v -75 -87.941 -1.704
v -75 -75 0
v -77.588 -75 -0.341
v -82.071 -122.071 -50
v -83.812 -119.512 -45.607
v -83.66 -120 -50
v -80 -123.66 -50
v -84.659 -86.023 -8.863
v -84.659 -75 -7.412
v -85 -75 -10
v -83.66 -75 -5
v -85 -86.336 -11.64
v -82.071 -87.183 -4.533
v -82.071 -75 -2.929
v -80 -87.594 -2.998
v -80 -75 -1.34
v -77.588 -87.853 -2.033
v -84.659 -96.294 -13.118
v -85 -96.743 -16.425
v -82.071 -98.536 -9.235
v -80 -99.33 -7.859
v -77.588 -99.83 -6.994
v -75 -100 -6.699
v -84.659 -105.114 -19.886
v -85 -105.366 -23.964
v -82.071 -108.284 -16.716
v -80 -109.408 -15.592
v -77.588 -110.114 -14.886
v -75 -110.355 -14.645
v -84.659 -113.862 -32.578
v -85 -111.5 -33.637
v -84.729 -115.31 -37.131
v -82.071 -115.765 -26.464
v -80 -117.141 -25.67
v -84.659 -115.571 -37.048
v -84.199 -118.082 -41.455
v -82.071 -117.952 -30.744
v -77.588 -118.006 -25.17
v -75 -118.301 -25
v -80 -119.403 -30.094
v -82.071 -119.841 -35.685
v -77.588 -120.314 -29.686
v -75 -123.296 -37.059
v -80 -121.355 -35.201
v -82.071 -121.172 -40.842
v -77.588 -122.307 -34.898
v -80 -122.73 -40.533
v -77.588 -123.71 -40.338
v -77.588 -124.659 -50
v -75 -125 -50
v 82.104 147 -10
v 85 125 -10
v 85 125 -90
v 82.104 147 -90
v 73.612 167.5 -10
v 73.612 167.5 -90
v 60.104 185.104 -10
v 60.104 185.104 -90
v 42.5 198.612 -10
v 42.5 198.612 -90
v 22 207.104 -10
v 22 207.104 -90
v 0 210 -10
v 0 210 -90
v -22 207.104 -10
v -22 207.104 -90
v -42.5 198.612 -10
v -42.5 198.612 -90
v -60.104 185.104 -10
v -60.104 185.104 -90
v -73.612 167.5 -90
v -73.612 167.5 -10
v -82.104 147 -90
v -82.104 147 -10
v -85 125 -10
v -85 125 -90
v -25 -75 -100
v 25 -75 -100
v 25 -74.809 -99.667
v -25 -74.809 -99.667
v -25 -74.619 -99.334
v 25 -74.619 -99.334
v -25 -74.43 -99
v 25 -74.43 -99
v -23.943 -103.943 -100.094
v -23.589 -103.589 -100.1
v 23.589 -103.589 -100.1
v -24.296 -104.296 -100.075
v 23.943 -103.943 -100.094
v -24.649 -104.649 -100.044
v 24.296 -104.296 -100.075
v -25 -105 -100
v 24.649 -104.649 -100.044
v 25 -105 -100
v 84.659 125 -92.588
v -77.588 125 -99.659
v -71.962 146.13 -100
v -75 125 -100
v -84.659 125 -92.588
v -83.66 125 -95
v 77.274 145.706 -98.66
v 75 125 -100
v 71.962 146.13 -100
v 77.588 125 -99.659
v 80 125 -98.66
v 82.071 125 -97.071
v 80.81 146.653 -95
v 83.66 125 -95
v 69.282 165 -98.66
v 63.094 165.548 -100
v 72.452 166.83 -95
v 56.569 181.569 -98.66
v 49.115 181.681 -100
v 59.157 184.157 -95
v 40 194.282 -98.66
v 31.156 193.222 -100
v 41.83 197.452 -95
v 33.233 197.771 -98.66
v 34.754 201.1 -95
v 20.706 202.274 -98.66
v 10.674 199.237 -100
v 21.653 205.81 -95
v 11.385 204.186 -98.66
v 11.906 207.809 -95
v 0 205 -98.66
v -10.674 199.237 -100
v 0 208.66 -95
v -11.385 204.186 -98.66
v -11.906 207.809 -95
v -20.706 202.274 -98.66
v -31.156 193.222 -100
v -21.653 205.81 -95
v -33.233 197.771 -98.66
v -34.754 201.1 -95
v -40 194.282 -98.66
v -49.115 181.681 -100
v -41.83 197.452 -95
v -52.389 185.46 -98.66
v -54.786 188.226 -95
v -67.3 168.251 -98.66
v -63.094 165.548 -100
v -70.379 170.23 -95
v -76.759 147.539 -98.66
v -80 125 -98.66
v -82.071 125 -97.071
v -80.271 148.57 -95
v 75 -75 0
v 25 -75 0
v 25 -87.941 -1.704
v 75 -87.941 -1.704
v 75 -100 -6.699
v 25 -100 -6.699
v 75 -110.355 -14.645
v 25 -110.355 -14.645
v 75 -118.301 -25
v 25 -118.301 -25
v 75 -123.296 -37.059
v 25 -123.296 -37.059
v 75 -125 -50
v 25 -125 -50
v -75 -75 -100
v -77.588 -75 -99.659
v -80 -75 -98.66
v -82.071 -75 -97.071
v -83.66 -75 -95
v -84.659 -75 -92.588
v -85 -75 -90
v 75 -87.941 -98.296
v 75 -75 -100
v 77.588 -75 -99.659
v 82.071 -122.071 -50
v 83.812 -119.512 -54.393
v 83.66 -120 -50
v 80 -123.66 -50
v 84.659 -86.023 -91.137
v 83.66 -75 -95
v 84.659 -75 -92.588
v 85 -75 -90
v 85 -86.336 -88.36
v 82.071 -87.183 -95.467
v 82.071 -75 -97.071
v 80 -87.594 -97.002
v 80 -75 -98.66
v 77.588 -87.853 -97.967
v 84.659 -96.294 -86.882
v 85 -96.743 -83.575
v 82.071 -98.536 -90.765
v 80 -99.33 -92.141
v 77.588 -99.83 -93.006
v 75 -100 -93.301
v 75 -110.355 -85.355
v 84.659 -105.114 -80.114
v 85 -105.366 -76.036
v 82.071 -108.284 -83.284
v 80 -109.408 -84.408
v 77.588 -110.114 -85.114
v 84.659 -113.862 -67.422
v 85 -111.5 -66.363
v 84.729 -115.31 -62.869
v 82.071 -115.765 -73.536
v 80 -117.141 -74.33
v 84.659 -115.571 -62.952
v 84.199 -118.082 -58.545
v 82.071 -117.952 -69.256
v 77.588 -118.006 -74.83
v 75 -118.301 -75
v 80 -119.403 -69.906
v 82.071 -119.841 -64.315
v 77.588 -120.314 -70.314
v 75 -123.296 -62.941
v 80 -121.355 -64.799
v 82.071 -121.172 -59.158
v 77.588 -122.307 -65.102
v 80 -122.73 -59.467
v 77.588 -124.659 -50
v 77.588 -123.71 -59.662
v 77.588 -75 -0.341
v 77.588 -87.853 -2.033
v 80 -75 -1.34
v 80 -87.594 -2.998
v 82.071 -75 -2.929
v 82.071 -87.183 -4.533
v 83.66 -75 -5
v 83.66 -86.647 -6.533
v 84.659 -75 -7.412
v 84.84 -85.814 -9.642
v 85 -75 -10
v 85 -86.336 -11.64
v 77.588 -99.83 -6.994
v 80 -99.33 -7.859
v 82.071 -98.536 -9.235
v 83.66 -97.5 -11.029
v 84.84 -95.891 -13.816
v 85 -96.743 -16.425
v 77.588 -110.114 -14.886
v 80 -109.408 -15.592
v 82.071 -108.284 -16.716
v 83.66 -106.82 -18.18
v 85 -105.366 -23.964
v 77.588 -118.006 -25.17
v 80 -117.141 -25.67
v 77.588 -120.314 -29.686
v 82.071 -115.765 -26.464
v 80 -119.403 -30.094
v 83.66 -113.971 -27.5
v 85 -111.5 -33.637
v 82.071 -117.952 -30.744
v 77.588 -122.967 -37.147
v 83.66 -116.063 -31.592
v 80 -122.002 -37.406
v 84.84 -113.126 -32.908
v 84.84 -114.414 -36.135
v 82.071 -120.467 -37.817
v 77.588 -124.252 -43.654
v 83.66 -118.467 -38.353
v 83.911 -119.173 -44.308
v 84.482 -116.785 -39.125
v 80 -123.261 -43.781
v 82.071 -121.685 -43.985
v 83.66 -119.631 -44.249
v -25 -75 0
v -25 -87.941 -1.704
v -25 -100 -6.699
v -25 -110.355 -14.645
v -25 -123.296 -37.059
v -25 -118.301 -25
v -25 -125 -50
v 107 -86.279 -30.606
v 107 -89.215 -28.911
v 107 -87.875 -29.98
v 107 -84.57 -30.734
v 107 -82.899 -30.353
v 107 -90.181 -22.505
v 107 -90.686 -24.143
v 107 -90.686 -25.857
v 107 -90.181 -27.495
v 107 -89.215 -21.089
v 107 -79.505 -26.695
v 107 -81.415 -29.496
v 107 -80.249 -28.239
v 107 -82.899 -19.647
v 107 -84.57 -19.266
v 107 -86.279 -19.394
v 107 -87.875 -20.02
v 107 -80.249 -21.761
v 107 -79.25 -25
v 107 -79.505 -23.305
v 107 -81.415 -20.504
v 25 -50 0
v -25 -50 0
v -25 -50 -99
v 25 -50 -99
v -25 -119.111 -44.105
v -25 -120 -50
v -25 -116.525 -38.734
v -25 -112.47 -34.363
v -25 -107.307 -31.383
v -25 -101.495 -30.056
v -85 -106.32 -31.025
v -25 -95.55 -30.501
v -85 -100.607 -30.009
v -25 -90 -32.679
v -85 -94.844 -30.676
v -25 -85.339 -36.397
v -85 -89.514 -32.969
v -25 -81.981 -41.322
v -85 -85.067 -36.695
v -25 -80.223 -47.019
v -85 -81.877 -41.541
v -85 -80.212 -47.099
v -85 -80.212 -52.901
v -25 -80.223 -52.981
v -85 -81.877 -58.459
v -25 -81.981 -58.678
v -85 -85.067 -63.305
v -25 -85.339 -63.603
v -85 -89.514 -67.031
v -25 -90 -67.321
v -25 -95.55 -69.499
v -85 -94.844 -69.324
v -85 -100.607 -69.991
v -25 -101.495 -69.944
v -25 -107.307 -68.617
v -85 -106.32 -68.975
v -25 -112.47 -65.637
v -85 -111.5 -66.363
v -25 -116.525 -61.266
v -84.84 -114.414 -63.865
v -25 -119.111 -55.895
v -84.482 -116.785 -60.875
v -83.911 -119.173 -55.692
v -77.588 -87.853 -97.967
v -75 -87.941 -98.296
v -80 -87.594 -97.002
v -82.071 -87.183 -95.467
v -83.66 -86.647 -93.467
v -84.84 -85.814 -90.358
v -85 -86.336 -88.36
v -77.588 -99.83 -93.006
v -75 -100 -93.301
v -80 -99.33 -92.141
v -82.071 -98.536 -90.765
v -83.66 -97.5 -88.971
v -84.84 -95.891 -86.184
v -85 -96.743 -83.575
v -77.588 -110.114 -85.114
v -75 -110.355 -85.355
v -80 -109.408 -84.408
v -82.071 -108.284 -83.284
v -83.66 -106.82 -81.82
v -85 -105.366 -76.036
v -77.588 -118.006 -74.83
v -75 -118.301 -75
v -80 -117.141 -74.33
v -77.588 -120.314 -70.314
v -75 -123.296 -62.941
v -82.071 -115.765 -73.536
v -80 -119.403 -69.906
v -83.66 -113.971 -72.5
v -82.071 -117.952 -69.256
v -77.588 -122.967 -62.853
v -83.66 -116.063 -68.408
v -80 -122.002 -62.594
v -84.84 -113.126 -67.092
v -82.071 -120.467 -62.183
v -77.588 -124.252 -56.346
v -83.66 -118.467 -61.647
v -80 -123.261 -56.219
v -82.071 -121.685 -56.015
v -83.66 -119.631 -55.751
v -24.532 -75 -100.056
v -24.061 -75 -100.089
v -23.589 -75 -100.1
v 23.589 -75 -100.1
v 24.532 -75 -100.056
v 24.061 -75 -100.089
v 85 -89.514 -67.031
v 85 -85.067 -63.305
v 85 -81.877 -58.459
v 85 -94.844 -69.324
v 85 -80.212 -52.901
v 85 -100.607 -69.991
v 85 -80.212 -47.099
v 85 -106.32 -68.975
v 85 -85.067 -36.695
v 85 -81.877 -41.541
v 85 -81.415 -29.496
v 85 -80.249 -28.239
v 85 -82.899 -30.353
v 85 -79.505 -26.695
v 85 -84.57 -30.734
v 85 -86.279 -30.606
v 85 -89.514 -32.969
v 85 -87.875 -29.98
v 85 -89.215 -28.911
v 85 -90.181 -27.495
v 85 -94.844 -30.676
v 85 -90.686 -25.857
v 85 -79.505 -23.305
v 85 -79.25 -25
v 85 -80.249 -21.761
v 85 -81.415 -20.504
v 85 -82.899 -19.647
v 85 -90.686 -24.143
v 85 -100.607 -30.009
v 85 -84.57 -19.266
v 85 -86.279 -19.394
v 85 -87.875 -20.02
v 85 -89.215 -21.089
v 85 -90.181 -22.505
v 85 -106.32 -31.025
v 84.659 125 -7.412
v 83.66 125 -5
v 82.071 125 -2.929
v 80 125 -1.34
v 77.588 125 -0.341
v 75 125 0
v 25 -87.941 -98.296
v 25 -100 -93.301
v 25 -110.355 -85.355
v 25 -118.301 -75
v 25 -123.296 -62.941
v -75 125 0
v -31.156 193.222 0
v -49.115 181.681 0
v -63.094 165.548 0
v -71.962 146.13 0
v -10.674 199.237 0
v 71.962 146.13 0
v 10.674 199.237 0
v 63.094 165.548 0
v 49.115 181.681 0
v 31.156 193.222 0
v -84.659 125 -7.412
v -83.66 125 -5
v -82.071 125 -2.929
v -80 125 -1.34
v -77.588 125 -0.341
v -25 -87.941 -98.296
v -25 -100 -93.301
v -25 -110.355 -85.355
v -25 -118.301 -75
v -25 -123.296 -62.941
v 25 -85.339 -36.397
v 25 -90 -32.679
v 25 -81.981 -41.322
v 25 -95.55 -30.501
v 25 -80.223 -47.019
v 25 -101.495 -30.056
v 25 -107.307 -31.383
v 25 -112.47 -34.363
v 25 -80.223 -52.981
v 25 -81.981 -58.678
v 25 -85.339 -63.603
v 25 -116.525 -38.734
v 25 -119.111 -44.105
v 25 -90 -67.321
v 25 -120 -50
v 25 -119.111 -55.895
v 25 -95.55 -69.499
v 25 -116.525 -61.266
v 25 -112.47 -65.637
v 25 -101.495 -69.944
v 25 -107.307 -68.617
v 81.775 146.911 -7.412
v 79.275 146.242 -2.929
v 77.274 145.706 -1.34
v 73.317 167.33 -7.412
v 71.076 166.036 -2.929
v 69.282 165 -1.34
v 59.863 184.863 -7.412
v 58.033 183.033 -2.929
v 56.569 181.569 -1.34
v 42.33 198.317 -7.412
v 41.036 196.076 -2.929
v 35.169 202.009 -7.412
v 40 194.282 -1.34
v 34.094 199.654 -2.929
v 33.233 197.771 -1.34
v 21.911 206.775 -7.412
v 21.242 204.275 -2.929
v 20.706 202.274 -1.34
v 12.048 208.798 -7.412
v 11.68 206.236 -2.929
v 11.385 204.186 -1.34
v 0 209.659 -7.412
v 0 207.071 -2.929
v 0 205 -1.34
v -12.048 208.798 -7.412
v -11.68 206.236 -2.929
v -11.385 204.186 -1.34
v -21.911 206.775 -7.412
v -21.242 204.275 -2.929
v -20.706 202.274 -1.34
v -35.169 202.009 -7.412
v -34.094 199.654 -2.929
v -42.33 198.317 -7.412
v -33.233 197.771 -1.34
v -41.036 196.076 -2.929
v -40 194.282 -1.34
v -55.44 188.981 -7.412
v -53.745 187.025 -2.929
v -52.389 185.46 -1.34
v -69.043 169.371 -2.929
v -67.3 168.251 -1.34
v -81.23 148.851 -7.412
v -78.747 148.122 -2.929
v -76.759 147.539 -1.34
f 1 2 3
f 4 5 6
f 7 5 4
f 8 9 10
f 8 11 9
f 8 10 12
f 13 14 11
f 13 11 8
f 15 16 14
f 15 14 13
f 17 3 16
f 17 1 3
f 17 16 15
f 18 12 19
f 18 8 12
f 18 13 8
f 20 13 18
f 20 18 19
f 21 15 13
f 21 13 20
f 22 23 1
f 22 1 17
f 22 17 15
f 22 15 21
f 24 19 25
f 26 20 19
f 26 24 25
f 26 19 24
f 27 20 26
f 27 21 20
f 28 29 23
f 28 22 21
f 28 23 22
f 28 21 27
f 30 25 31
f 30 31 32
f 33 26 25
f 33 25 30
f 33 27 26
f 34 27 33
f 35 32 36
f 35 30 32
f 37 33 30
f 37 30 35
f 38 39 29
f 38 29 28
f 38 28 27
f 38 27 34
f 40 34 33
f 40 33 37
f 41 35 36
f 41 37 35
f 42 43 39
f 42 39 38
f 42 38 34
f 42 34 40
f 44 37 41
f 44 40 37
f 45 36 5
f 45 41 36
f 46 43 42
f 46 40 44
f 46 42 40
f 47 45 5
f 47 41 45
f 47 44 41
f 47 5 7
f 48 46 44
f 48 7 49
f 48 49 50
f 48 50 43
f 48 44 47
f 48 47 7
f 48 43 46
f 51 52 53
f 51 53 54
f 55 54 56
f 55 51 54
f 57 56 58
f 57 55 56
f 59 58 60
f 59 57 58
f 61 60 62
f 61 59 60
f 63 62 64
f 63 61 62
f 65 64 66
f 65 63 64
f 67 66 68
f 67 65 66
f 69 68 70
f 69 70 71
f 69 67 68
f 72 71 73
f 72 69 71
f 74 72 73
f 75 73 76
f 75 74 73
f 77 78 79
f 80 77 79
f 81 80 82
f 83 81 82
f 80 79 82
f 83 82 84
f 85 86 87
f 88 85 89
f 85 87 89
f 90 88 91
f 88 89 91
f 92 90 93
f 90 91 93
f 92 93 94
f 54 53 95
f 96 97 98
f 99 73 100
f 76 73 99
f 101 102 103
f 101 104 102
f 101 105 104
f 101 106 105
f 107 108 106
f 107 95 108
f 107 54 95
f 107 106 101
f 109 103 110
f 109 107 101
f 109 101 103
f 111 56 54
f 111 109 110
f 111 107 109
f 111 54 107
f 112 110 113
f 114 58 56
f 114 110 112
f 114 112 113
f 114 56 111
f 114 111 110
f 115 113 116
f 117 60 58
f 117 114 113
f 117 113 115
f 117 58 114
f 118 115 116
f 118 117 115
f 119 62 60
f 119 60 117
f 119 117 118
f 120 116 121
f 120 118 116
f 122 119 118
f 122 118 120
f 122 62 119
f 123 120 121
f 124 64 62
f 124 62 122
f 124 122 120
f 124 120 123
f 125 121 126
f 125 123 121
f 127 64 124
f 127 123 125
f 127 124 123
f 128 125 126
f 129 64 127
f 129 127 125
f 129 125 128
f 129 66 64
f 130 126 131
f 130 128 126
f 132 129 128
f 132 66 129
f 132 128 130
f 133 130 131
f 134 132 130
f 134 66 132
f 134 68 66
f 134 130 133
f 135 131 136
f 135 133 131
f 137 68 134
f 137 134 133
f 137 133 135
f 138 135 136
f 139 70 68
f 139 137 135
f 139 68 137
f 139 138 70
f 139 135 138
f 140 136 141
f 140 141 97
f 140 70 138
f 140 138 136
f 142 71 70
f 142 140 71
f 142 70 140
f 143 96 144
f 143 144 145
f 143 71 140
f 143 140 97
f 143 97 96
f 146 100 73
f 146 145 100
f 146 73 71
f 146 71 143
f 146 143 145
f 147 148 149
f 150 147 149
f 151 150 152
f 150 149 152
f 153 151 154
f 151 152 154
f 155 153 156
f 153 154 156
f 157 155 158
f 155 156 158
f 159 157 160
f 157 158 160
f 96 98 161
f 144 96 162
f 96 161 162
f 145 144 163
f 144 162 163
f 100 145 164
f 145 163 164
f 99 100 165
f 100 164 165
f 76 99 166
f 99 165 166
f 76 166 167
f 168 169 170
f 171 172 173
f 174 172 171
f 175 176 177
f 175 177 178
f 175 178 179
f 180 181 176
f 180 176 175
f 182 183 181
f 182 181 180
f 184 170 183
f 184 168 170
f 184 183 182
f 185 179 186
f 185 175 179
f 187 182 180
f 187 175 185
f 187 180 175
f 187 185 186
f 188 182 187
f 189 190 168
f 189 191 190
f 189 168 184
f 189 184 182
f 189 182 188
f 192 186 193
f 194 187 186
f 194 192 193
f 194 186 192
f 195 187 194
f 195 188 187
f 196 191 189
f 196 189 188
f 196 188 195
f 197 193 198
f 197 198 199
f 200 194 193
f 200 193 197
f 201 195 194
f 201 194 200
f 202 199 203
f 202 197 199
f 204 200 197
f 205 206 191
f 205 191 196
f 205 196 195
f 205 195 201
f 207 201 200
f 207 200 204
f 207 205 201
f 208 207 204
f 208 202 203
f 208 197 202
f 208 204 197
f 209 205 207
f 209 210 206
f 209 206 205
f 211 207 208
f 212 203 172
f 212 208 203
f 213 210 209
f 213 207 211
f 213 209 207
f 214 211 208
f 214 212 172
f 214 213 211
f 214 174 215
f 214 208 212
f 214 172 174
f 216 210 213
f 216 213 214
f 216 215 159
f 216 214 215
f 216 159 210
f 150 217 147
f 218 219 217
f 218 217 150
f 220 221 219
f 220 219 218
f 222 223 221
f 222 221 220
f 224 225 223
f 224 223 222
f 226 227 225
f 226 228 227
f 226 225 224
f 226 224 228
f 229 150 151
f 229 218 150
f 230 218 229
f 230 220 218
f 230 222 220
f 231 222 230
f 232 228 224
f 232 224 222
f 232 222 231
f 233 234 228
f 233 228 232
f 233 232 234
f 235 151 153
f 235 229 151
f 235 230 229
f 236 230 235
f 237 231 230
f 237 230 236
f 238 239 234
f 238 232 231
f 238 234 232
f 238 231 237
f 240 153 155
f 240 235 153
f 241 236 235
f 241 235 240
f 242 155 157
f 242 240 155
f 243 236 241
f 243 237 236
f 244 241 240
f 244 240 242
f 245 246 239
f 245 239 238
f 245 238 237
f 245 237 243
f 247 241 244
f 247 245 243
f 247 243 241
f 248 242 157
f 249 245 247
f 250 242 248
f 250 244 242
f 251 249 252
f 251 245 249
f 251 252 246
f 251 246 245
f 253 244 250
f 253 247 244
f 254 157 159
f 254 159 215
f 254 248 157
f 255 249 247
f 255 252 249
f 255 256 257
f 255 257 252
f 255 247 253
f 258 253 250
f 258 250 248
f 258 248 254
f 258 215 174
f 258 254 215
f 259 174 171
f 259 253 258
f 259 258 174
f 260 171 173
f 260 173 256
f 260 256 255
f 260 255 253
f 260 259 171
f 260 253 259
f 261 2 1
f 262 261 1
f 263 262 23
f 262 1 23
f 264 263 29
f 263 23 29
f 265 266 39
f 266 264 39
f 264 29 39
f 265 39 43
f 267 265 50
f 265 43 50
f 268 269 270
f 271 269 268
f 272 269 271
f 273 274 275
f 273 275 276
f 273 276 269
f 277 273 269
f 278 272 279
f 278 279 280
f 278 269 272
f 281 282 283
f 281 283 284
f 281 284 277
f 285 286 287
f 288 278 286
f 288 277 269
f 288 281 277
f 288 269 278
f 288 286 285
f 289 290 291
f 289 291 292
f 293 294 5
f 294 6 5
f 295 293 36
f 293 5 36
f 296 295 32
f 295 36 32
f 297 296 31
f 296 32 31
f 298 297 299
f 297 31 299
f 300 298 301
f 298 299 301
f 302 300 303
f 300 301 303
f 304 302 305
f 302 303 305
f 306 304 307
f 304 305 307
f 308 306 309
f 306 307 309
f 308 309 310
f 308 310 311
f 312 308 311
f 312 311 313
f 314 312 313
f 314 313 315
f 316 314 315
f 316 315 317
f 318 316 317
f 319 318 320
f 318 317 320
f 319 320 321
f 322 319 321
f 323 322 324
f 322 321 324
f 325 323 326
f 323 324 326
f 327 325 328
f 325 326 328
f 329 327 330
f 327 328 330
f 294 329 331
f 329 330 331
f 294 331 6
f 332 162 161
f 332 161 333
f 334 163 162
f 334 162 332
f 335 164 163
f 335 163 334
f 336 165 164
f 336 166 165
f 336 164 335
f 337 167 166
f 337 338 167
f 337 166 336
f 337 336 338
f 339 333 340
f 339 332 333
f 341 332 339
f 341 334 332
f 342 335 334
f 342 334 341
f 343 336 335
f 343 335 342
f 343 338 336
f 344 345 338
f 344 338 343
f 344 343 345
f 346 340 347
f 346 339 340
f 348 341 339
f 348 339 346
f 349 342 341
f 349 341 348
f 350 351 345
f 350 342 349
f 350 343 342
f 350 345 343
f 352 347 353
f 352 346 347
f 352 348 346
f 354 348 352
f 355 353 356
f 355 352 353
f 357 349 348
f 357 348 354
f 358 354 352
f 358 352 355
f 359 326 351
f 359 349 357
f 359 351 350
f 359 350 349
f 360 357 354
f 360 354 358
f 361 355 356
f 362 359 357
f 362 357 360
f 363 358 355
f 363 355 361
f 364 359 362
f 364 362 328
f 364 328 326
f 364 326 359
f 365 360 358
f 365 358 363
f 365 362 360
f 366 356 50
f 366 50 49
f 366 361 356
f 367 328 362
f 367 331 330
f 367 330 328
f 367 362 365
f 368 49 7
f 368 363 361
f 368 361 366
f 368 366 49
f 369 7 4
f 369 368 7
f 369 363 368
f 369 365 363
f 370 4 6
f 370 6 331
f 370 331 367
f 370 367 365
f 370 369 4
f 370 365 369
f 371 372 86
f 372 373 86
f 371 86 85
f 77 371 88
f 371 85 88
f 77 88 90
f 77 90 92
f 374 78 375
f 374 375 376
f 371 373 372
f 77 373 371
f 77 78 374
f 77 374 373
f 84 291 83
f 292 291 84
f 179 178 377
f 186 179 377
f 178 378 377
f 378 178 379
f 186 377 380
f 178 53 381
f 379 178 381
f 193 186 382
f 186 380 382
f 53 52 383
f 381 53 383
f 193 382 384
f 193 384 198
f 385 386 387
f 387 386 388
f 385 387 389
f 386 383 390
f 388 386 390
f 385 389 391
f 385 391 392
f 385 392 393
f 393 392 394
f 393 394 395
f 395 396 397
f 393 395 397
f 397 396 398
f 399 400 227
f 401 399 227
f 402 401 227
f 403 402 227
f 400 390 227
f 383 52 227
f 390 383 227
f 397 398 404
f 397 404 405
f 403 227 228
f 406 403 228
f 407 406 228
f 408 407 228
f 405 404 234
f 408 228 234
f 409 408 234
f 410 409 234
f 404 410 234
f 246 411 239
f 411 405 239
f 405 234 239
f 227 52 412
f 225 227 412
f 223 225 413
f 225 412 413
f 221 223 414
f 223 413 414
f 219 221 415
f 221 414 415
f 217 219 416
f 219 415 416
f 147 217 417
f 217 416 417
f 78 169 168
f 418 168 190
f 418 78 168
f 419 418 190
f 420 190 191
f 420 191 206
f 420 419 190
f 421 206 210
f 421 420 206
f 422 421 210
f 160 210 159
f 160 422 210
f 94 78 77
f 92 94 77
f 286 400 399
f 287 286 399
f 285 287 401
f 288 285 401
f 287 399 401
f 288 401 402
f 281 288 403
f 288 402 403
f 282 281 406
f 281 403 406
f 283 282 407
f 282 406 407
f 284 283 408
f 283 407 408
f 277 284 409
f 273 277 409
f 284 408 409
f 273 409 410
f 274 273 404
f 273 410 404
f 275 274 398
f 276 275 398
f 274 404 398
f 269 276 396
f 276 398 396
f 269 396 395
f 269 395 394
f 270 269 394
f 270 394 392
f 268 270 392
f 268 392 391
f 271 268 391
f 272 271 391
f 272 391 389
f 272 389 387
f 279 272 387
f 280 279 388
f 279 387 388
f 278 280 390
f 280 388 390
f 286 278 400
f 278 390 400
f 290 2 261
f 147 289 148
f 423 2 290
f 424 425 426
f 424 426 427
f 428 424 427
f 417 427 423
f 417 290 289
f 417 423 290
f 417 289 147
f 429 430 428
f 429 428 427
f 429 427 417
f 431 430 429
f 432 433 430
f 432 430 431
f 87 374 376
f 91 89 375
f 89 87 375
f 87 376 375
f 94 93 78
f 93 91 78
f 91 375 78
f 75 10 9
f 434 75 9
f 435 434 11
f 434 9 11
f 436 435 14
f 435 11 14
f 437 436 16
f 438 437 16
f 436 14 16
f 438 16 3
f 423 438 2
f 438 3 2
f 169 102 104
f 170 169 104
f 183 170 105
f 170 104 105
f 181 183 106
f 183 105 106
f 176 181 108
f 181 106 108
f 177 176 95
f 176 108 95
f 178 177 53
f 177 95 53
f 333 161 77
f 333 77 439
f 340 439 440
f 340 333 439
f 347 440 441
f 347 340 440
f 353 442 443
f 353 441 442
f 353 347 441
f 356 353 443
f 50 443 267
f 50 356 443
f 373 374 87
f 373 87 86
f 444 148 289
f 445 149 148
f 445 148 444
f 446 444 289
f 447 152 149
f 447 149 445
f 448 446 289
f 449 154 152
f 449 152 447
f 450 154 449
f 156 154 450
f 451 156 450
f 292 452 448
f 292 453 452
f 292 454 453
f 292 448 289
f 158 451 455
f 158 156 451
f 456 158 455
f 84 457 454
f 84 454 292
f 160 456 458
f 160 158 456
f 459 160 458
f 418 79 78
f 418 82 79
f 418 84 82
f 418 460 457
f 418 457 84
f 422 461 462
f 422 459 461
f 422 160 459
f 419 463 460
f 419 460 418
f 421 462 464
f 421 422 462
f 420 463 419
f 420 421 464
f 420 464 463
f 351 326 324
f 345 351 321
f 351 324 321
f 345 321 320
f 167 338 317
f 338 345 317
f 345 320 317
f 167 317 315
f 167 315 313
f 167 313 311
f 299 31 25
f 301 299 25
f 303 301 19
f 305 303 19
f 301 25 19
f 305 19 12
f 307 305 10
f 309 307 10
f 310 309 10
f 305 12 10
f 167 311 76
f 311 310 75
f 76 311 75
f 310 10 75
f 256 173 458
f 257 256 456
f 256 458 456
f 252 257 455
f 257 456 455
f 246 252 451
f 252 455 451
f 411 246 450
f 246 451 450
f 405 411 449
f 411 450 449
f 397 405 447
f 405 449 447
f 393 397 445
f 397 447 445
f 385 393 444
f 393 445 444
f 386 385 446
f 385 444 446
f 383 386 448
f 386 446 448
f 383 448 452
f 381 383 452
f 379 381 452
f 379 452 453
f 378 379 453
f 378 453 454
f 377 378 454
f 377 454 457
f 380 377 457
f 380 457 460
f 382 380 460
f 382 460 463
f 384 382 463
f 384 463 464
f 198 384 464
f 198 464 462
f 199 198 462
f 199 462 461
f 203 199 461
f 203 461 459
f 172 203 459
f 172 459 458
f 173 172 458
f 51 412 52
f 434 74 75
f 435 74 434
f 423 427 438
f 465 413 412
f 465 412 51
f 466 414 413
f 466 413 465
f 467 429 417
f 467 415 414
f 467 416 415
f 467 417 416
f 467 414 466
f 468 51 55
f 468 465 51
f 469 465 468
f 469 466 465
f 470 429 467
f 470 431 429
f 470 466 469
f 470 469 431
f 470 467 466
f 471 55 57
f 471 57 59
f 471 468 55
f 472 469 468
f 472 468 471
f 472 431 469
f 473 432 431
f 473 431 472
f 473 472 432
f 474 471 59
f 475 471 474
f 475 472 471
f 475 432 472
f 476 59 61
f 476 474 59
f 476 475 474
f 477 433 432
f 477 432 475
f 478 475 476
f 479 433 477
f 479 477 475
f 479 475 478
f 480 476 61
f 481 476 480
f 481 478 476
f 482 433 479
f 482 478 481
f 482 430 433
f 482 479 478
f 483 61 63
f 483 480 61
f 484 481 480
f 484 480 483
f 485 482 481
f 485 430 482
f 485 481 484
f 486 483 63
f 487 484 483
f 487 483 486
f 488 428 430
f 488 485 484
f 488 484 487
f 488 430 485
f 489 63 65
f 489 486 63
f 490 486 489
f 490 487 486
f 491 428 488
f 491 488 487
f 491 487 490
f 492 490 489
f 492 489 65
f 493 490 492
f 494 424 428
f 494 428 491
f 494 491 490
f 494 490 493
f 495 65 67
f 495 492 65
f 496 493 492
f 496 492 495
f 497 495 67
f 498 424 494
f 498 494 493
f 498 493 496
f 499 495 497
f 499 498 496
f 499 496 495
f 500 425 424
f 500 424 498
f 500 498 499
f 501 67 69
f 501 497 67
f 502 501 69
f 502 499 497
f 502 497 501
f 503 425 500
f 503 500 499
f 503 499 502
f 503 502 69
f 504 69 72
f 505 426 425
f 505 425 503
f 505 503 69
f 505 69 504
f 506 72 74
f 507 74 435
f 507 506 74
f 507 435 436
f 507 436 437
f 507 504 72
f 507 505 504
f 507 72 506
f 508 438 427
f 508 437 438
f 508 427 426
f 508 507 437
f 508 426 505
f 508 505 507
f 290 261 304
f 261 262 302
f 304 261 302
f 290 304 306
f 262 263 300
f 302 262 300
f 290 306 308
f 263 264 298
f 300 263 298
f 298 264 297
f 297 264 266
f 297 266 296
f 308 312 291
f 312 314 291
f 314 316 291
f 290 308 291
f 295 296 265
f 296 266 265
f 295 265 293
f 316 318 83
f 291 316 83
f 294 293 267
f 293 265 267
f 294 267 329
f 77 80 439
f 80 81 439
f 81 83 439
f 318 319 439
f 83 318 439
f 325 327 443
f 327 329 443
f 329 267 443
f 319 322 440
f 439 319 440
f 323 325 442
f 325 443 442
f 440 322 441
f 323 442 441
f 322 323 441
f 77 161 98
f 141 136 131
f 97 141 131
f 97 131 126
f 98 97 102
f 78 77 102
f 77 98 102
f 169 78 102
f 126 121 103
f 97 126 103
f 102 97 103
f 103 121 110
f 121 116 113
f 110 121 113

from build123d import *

# Parameters (mm, degrees)
BOSS_EXTRUDE1_DEPTH    = 100
SKETCH2_W              = 50
SKETCH2_H              = 50
CUT_EXTRUDE1_DEPTH     = 182.245689604
CUT_EXTRUDE2_DEPTH     = 25
SKETCH7_R              = 20
CUT_EXTRUDE3_DEPTH     = 234.505888577
FILLET2_R              = 50
CUT_EXTRUDE6_START     = -125
CUT_EXTRUDE6_OUTLINE_W = 50
CUT_EXTRUDE6_OUTLINE_H = 6.698729811
CUT_EXTRUDE6_DEPTH     = 50
CUT_EXTRUDE7_DEPTH     = 25
BOSS_EXTRUDE2_DEPTH    = 100
FILLET4_R              = 10
SKETCH11_W             = 50
SKETCH11_H             = 25
CUT_EXTRUDE11_DEPTH    = 99
SKETCH16_W             = 50
SKETCH16_H             = 30
BOSS_EXTRUDE3_DEPTH    = 0.1
FILLET5_R              = 10
SKETCH17_R             = 5.75
BOSS_EXTRUDE4_DEPTH    = 22


with BuildPart() as part:
    # Sketch1 → Boss-Extrude1 (new body)
    with BuildSketch(Plane.XY):
        Polygon((-85, 125), (10.2, 125), (59.8, 125), (85, 125), (85, -125), (-85, -125), align=None)
    extrude(amount=-BOSS_EXTRUDE1_DEPTH)

    # Sketch2 → Cut-Extrude1 (cut, through all)
    with BuildSketch(Plane.XY):
        with Locations((0, -125)):
            Rectangle(SKETCH2_W, SKETCH2_H)
    extrude(amount=-CUT_EXTRUDE1_DEPTH, mode=Mode.SUBTRACT)

    # Sketch6 → Cut-Extrude2 (cut, symmetric)
    with BuildSketch(Plane(origin=(0, 0, 0), x_dir=(0, 0, -1), z_dir=(1, 0, 0))):
        with BuildLine():
            Line((100, -100), (0, -100))
            ThreePointArc((0, -100), (50, -50), (100, -100))
        make_face()
    extrude(amount=CUT_EXTRUDE2_DEPTH, both=True, mode=Mode.SUBTRACT)

    # Sketch7 → Cut-Extrude3 (cut, through all)
    with BuildSketch(Plane.ZY.offset(85)):
        with Locations(Location((-50, -100, 0), (0, 0, 270))):
            Circle(SKETCH7_R)
    extrude(amount=-CUT_EXTRUDE3_DEPTH, mode=Mode.SUBTRACT)

    # Fillet2
    fillet2_edges = [part.edges().sort_by_distance(p)[0] for p in [
        (-55, -125, -100),
        (-55, -125, 0),
    ]]
    fillet(fillet2_edges, radius=FILLET2_R - 0.0001)  # a hair under: the kernel refuses the full size

    # Cut-Extrude6: read off the stored shape, not the designer's step
    # Cut-Extrude6 outline → Cut-Extrude6 (cut)
    with BuildSketch(Plane(origin=(0, 0, 0), x_dir=(1, 0, 0), z_dir=(0, 1, 0)).offset(CUT_EXTRUDE6_START)):
        with Locations((0, 96.650635095)):
            Rectangle(CUT_EXTRUDE6_OUTLINE_W, CUT_EXTRUDE6_OUTLINE_H)
        with Locations((0, 3.349364906)):
            Rectangle(CUT_EXTRUDE6_OUTLINE_W, CUT_EXTRUDE6_OUTLINE_H)
    extrude(amount=CUT_EXTRUDE6_DEPTH, mode=Mode.SUBTRACT)

    # Sketch10 → Cut-Extrude7 (cut, symmetric)
    with BuildSketch(Plane(origin=(0, 0, 0), x_dir=(0, 0, -1), z_dir=(1, 0, 0))):
        with BuildLine():
            Line((0, -75), (100, -75))
            ThreePointArc((100, -75), (50, -61.602540378), (0, -75))
        make_face()
    extrude(amount=CUT_EXTRUDE7_DEPTH, both=True, mode=Mode.SUBTRACT)

    # Sketch15 → Boss-Extrude2 (add)
    with BuildSketch(Plane.XY):
        with BuildLine():
            Line((-85, 125), (85, 125))
            ThreePointArc((85, 125), (0, 210), (-85, 125))
        make_face()
    extrude(amount=-BOSS_EXTRUDE2_DEPTH)

    # Fillet4
    # the kernel refuses this fillet: 10 mm, written as the material it takes off along each edge
    with BuildSketch(Plane(origin=(0, 125, -100), x_dir=(1, 0, 0), z_dir=(0, -1, 0))) as fillet4_piece_1:
        with BuildLine():
            CenterArc((85 - FILLET4_R, FILLET4_R), FILLET4_R, 270, 90)
            Line((85, FILLET4_R), (85, 0))
            Line((85, 0), (85 - FILLET4_R, 0))
        make_face()
    revolve(axis=Axis((0, 125, -100), (0, 0, 1)), revolution_arc=180, mode=Mode.SUBTRACT)
    with BuildSketch(Plane(origin=(0, 125, 0), x_dir=(1, 0, 0), z_dir=(0, -1, 0))) as fillet4_piece_2:
        with BuildLine():
            CenterArc((85 - FILLET4_R, -FILLET4_R), FILLET4_R, 0, 90)
            Line((85, -FILLET4_R), (85, 0))
            Line((85, 0), (85 - FILLET4_R, 0))
        make_face()
    revolve(axis=Axis((0, 125, 0), (0, 0, 1)), revolution_arc=180, mode=Mode.SUBTRACT)
    with BuildSketch(Plane(origin=(-85, -75.0001, -100), x_dir=(0, 0, 1), z_dir=(0, 1, 0)), Plane(origin=(85, 125, 0), x_dir=(-1, 0, 0), z_dir=(0, -1, 0))) as fillet4_piece_3:
        with BuildLine():
            CenterArc((FILLET4_R, FILLET4_R), FILLET4_R, 180, 90)
            Line((0, FILLET4_R), (0, 0))
            Line((0, 0), (FILLET4_R, 0))
        make_face()
    extrude(amount=200.0001, mode=Mode.SUBTRACT)
    with BuildSketch(Plane(origin=(85, 125, -100), x_dir=(-1, 0, 0), z_dir=(0, -1, 0)), Plane(origin=(-85, -75.0001, 0), x_dir=(0, 0, -1), z_dir=(0, 1, 0))) as fillet4_piece_4:
        with BuildLine():
            CenterArc((FILLET4_R, -FILLET4_R), FILLET4_R, 90, 90)
            Line((0, -FILLET4_R), (0, 0))
            Line((0, 0), (FILLET4_R, 0))
        make_face()
    extrude(amount=200.0001, mode=Mode.SUBTRACT)
    with BuildSketch(Plane(origin=(85, -75.0001, -49.9999), x_dir=(0, 0, 1), z_dir=(0, 1, 0))) as fillet4_piece_5:
        with BuildLine():
            CenterArc((49.9999 - FILLET4_R, -FILLET4_R), FILLET4_R, 0, 90)
            Line((49.9999 - FILLET4_R, 0), (49.9999, 0))
            Line((49.9999, 0), (49.9999, -FILLET4_R))
        make_face()
    revolve(axis=Axis((85, -75.0001, -49.9999), (1, 0, 0)), revolution_arc=90, mode=Mode.SUBTRACT)
    with BuildSketch(Plane(origin=(85, -75.0001, -50.0001), x_dir=(0, 0, -1), z_dir=(0, 1, 0))) as fillet4_piece_6:
        with BuildLine():
            CenterArc((49.9999 - FILLET4_R, FILLET4_R), FILLET4_R, 270, 90)
            Line((49.9999, FILLET4_R), (49.9999, 0))
            Line((49.9999, 0), (49.9999 - FILLET4_R, 0))
        make_face()
    revolve(axis=Axis((85, -75.0001, -50.0001), (-1, 0, 0)), revolution_arc=90, mode=Mode.SUBTRACT)
    with BuildSketch(Plane(origin=(-85, -75.0001, -49.9999), x_dir=(0, 0, 1), z_dir=(0, 1, 0))) as fillet4_piece_7:
        with BuildLine():
            CenterArc((49.9999 - FILLET4_R, FILLET4_R), FILLET4_R, 270, 90)
            Line((49.9999, FILLET4_R), (49.9999, 0))
            Line((49.9999, 0), (49.9999 - FILLET4_R, 0))
        make_face()
    revolve(axis=Axis((-85, -75.0001, -49.9999), (1, 0, 0)), revolution_arc=90, mode=Mode.SUBTRACT)
    with BuildSketch(Plane(origin=(-85, -75.0001, -50.0001), x_dir=(0, 0, -1), z_dir=(0, 1, 0))) as fillet4_piece_8:
        with BuildLine():
            CenterArc((49.9999 - FILLET4_R, -FILLET4_R), FILLET4_R, 0, 90)
            Line((49.9999, -FILLET4_R), (49.9999, 0))
            Line((49.9999, 0), (49.9999 - FILLET4_R, 0))
        make_face()
    revolve(axis=Axis((-85, -75.0001, -50.0001), (-1, 0, 0)), revolution_arc=90, mode=Mode.SUBTRACT)
    with BuildSketch(Plane(origin=(-85, -125, -49.9999), x_dir=(0, 1, 0), z_dir=(0, 0, -1))) as fillet4_piece_9:
        with BuildLine():
            CenterArc((FILLET4_R, FILLET4_R), FILLET4_R, 180, 90)
            Line((0, FILLET4_R), (0, 0))
            Line((0, 0), (FILLET4_R, 0))
        make_face()
    extrude(amount=0.0002, mode=Mode.SUBTRACT)
    with BuildSketch(Plane(origin=(85, -125, -49.9999), x_dir=(0, 1, 0), z_dir=(0, 0, -1))) as fillet4_piece_10:
        with BuildLine():
            CenterArc((FILLET4_R, -FILLET4_R), FILLET4_R, 90, 90)
            Line((0, -FILLET4_R), (0, 0))
            Line((0, 0), (FILLET4_R, 0))
        make_face()
    extrude(amount=0.0002, mode=Mode.SUBTRACT)

    # Sketch11 → Cut-Extrude11 (cut)
    with BuildSketch(Plane.XY):
        with Locations((0, -62.5)):
            Rectangle(SKETCH11_W, SKETCH11_H)
    extrude(amount=-CUT_EXTRUDE11_DEPTH, mode=Mode.SUBTRACT)

    # Sketch17 → Boss-Extrude4 (add)
    with BuildSketch(Plane(origin=(85, 0, 0), x_dir=(0, 0, -1), z_dir=(1, 0, 0))):
        with Locations(Location((25, -85, 0), (0, 0, 90))):
            Circle(SKETCH17_R)
    extrude(amount=BOSS_EXTRUDE4_DEPTH)


with BuildPart() as body_2:
    # Sketch16 → Boss-Extrude3 (new body)
    with BuildSketch(Plane(origin=(0, 0, -100), x_dir=(-1, 0, 0), z_dir=(0, 0, -1))):
        with Locations((0, -90)):
            Rectangle(SKETCH16_W, SKETCH16_H)
    extrude(amount=BOSS_EXTRUDE3_DEPTH)

    # Fillet5
    # the kernel refuses this fillet: 10 mm, written as the material it takes off along each edge
    with BuildSketch(Plane(origin=(25, -71.473316005, -100.1), x_dir=(0, 0, 1), z_dir=(0, -1, 0)), Plane(origin=(-25, -108.526683995, -100.1), x_dir=(0, 0, 1), z_dir=(0, 1, 0))) as fillet5_piece_1:
        with BuildLine():
            CenterArc((10, 1.410673598), FILLET5_R, 180, 8.109614456)
            Line((0, 1.410673598), (0, 0))
            Line((0, 0), (0.1, 0))
        make_face()
    extrude(amount=37.05336799, mode=Mode.SUBTRACT)
    with BuildSketch(Plane(origin=(28.526683995, -105, -100.1), x_dir=(0, 0, 1), z_dir=(-1, 0, 0))) as fillet5_piece_2:
        with BuildLine():
            CenterArc((10, 1.410673598), FILLET5_R, 180, 8.109614456)
            Line((0, 1.410673598), (0, 0))
            Line((0, 0), (0.1, 0))
        make_face()
    extrude(amount=57.05336799, mode=Mode.SUBTRACT)


solid = Compound([part.part, body_2.part])
